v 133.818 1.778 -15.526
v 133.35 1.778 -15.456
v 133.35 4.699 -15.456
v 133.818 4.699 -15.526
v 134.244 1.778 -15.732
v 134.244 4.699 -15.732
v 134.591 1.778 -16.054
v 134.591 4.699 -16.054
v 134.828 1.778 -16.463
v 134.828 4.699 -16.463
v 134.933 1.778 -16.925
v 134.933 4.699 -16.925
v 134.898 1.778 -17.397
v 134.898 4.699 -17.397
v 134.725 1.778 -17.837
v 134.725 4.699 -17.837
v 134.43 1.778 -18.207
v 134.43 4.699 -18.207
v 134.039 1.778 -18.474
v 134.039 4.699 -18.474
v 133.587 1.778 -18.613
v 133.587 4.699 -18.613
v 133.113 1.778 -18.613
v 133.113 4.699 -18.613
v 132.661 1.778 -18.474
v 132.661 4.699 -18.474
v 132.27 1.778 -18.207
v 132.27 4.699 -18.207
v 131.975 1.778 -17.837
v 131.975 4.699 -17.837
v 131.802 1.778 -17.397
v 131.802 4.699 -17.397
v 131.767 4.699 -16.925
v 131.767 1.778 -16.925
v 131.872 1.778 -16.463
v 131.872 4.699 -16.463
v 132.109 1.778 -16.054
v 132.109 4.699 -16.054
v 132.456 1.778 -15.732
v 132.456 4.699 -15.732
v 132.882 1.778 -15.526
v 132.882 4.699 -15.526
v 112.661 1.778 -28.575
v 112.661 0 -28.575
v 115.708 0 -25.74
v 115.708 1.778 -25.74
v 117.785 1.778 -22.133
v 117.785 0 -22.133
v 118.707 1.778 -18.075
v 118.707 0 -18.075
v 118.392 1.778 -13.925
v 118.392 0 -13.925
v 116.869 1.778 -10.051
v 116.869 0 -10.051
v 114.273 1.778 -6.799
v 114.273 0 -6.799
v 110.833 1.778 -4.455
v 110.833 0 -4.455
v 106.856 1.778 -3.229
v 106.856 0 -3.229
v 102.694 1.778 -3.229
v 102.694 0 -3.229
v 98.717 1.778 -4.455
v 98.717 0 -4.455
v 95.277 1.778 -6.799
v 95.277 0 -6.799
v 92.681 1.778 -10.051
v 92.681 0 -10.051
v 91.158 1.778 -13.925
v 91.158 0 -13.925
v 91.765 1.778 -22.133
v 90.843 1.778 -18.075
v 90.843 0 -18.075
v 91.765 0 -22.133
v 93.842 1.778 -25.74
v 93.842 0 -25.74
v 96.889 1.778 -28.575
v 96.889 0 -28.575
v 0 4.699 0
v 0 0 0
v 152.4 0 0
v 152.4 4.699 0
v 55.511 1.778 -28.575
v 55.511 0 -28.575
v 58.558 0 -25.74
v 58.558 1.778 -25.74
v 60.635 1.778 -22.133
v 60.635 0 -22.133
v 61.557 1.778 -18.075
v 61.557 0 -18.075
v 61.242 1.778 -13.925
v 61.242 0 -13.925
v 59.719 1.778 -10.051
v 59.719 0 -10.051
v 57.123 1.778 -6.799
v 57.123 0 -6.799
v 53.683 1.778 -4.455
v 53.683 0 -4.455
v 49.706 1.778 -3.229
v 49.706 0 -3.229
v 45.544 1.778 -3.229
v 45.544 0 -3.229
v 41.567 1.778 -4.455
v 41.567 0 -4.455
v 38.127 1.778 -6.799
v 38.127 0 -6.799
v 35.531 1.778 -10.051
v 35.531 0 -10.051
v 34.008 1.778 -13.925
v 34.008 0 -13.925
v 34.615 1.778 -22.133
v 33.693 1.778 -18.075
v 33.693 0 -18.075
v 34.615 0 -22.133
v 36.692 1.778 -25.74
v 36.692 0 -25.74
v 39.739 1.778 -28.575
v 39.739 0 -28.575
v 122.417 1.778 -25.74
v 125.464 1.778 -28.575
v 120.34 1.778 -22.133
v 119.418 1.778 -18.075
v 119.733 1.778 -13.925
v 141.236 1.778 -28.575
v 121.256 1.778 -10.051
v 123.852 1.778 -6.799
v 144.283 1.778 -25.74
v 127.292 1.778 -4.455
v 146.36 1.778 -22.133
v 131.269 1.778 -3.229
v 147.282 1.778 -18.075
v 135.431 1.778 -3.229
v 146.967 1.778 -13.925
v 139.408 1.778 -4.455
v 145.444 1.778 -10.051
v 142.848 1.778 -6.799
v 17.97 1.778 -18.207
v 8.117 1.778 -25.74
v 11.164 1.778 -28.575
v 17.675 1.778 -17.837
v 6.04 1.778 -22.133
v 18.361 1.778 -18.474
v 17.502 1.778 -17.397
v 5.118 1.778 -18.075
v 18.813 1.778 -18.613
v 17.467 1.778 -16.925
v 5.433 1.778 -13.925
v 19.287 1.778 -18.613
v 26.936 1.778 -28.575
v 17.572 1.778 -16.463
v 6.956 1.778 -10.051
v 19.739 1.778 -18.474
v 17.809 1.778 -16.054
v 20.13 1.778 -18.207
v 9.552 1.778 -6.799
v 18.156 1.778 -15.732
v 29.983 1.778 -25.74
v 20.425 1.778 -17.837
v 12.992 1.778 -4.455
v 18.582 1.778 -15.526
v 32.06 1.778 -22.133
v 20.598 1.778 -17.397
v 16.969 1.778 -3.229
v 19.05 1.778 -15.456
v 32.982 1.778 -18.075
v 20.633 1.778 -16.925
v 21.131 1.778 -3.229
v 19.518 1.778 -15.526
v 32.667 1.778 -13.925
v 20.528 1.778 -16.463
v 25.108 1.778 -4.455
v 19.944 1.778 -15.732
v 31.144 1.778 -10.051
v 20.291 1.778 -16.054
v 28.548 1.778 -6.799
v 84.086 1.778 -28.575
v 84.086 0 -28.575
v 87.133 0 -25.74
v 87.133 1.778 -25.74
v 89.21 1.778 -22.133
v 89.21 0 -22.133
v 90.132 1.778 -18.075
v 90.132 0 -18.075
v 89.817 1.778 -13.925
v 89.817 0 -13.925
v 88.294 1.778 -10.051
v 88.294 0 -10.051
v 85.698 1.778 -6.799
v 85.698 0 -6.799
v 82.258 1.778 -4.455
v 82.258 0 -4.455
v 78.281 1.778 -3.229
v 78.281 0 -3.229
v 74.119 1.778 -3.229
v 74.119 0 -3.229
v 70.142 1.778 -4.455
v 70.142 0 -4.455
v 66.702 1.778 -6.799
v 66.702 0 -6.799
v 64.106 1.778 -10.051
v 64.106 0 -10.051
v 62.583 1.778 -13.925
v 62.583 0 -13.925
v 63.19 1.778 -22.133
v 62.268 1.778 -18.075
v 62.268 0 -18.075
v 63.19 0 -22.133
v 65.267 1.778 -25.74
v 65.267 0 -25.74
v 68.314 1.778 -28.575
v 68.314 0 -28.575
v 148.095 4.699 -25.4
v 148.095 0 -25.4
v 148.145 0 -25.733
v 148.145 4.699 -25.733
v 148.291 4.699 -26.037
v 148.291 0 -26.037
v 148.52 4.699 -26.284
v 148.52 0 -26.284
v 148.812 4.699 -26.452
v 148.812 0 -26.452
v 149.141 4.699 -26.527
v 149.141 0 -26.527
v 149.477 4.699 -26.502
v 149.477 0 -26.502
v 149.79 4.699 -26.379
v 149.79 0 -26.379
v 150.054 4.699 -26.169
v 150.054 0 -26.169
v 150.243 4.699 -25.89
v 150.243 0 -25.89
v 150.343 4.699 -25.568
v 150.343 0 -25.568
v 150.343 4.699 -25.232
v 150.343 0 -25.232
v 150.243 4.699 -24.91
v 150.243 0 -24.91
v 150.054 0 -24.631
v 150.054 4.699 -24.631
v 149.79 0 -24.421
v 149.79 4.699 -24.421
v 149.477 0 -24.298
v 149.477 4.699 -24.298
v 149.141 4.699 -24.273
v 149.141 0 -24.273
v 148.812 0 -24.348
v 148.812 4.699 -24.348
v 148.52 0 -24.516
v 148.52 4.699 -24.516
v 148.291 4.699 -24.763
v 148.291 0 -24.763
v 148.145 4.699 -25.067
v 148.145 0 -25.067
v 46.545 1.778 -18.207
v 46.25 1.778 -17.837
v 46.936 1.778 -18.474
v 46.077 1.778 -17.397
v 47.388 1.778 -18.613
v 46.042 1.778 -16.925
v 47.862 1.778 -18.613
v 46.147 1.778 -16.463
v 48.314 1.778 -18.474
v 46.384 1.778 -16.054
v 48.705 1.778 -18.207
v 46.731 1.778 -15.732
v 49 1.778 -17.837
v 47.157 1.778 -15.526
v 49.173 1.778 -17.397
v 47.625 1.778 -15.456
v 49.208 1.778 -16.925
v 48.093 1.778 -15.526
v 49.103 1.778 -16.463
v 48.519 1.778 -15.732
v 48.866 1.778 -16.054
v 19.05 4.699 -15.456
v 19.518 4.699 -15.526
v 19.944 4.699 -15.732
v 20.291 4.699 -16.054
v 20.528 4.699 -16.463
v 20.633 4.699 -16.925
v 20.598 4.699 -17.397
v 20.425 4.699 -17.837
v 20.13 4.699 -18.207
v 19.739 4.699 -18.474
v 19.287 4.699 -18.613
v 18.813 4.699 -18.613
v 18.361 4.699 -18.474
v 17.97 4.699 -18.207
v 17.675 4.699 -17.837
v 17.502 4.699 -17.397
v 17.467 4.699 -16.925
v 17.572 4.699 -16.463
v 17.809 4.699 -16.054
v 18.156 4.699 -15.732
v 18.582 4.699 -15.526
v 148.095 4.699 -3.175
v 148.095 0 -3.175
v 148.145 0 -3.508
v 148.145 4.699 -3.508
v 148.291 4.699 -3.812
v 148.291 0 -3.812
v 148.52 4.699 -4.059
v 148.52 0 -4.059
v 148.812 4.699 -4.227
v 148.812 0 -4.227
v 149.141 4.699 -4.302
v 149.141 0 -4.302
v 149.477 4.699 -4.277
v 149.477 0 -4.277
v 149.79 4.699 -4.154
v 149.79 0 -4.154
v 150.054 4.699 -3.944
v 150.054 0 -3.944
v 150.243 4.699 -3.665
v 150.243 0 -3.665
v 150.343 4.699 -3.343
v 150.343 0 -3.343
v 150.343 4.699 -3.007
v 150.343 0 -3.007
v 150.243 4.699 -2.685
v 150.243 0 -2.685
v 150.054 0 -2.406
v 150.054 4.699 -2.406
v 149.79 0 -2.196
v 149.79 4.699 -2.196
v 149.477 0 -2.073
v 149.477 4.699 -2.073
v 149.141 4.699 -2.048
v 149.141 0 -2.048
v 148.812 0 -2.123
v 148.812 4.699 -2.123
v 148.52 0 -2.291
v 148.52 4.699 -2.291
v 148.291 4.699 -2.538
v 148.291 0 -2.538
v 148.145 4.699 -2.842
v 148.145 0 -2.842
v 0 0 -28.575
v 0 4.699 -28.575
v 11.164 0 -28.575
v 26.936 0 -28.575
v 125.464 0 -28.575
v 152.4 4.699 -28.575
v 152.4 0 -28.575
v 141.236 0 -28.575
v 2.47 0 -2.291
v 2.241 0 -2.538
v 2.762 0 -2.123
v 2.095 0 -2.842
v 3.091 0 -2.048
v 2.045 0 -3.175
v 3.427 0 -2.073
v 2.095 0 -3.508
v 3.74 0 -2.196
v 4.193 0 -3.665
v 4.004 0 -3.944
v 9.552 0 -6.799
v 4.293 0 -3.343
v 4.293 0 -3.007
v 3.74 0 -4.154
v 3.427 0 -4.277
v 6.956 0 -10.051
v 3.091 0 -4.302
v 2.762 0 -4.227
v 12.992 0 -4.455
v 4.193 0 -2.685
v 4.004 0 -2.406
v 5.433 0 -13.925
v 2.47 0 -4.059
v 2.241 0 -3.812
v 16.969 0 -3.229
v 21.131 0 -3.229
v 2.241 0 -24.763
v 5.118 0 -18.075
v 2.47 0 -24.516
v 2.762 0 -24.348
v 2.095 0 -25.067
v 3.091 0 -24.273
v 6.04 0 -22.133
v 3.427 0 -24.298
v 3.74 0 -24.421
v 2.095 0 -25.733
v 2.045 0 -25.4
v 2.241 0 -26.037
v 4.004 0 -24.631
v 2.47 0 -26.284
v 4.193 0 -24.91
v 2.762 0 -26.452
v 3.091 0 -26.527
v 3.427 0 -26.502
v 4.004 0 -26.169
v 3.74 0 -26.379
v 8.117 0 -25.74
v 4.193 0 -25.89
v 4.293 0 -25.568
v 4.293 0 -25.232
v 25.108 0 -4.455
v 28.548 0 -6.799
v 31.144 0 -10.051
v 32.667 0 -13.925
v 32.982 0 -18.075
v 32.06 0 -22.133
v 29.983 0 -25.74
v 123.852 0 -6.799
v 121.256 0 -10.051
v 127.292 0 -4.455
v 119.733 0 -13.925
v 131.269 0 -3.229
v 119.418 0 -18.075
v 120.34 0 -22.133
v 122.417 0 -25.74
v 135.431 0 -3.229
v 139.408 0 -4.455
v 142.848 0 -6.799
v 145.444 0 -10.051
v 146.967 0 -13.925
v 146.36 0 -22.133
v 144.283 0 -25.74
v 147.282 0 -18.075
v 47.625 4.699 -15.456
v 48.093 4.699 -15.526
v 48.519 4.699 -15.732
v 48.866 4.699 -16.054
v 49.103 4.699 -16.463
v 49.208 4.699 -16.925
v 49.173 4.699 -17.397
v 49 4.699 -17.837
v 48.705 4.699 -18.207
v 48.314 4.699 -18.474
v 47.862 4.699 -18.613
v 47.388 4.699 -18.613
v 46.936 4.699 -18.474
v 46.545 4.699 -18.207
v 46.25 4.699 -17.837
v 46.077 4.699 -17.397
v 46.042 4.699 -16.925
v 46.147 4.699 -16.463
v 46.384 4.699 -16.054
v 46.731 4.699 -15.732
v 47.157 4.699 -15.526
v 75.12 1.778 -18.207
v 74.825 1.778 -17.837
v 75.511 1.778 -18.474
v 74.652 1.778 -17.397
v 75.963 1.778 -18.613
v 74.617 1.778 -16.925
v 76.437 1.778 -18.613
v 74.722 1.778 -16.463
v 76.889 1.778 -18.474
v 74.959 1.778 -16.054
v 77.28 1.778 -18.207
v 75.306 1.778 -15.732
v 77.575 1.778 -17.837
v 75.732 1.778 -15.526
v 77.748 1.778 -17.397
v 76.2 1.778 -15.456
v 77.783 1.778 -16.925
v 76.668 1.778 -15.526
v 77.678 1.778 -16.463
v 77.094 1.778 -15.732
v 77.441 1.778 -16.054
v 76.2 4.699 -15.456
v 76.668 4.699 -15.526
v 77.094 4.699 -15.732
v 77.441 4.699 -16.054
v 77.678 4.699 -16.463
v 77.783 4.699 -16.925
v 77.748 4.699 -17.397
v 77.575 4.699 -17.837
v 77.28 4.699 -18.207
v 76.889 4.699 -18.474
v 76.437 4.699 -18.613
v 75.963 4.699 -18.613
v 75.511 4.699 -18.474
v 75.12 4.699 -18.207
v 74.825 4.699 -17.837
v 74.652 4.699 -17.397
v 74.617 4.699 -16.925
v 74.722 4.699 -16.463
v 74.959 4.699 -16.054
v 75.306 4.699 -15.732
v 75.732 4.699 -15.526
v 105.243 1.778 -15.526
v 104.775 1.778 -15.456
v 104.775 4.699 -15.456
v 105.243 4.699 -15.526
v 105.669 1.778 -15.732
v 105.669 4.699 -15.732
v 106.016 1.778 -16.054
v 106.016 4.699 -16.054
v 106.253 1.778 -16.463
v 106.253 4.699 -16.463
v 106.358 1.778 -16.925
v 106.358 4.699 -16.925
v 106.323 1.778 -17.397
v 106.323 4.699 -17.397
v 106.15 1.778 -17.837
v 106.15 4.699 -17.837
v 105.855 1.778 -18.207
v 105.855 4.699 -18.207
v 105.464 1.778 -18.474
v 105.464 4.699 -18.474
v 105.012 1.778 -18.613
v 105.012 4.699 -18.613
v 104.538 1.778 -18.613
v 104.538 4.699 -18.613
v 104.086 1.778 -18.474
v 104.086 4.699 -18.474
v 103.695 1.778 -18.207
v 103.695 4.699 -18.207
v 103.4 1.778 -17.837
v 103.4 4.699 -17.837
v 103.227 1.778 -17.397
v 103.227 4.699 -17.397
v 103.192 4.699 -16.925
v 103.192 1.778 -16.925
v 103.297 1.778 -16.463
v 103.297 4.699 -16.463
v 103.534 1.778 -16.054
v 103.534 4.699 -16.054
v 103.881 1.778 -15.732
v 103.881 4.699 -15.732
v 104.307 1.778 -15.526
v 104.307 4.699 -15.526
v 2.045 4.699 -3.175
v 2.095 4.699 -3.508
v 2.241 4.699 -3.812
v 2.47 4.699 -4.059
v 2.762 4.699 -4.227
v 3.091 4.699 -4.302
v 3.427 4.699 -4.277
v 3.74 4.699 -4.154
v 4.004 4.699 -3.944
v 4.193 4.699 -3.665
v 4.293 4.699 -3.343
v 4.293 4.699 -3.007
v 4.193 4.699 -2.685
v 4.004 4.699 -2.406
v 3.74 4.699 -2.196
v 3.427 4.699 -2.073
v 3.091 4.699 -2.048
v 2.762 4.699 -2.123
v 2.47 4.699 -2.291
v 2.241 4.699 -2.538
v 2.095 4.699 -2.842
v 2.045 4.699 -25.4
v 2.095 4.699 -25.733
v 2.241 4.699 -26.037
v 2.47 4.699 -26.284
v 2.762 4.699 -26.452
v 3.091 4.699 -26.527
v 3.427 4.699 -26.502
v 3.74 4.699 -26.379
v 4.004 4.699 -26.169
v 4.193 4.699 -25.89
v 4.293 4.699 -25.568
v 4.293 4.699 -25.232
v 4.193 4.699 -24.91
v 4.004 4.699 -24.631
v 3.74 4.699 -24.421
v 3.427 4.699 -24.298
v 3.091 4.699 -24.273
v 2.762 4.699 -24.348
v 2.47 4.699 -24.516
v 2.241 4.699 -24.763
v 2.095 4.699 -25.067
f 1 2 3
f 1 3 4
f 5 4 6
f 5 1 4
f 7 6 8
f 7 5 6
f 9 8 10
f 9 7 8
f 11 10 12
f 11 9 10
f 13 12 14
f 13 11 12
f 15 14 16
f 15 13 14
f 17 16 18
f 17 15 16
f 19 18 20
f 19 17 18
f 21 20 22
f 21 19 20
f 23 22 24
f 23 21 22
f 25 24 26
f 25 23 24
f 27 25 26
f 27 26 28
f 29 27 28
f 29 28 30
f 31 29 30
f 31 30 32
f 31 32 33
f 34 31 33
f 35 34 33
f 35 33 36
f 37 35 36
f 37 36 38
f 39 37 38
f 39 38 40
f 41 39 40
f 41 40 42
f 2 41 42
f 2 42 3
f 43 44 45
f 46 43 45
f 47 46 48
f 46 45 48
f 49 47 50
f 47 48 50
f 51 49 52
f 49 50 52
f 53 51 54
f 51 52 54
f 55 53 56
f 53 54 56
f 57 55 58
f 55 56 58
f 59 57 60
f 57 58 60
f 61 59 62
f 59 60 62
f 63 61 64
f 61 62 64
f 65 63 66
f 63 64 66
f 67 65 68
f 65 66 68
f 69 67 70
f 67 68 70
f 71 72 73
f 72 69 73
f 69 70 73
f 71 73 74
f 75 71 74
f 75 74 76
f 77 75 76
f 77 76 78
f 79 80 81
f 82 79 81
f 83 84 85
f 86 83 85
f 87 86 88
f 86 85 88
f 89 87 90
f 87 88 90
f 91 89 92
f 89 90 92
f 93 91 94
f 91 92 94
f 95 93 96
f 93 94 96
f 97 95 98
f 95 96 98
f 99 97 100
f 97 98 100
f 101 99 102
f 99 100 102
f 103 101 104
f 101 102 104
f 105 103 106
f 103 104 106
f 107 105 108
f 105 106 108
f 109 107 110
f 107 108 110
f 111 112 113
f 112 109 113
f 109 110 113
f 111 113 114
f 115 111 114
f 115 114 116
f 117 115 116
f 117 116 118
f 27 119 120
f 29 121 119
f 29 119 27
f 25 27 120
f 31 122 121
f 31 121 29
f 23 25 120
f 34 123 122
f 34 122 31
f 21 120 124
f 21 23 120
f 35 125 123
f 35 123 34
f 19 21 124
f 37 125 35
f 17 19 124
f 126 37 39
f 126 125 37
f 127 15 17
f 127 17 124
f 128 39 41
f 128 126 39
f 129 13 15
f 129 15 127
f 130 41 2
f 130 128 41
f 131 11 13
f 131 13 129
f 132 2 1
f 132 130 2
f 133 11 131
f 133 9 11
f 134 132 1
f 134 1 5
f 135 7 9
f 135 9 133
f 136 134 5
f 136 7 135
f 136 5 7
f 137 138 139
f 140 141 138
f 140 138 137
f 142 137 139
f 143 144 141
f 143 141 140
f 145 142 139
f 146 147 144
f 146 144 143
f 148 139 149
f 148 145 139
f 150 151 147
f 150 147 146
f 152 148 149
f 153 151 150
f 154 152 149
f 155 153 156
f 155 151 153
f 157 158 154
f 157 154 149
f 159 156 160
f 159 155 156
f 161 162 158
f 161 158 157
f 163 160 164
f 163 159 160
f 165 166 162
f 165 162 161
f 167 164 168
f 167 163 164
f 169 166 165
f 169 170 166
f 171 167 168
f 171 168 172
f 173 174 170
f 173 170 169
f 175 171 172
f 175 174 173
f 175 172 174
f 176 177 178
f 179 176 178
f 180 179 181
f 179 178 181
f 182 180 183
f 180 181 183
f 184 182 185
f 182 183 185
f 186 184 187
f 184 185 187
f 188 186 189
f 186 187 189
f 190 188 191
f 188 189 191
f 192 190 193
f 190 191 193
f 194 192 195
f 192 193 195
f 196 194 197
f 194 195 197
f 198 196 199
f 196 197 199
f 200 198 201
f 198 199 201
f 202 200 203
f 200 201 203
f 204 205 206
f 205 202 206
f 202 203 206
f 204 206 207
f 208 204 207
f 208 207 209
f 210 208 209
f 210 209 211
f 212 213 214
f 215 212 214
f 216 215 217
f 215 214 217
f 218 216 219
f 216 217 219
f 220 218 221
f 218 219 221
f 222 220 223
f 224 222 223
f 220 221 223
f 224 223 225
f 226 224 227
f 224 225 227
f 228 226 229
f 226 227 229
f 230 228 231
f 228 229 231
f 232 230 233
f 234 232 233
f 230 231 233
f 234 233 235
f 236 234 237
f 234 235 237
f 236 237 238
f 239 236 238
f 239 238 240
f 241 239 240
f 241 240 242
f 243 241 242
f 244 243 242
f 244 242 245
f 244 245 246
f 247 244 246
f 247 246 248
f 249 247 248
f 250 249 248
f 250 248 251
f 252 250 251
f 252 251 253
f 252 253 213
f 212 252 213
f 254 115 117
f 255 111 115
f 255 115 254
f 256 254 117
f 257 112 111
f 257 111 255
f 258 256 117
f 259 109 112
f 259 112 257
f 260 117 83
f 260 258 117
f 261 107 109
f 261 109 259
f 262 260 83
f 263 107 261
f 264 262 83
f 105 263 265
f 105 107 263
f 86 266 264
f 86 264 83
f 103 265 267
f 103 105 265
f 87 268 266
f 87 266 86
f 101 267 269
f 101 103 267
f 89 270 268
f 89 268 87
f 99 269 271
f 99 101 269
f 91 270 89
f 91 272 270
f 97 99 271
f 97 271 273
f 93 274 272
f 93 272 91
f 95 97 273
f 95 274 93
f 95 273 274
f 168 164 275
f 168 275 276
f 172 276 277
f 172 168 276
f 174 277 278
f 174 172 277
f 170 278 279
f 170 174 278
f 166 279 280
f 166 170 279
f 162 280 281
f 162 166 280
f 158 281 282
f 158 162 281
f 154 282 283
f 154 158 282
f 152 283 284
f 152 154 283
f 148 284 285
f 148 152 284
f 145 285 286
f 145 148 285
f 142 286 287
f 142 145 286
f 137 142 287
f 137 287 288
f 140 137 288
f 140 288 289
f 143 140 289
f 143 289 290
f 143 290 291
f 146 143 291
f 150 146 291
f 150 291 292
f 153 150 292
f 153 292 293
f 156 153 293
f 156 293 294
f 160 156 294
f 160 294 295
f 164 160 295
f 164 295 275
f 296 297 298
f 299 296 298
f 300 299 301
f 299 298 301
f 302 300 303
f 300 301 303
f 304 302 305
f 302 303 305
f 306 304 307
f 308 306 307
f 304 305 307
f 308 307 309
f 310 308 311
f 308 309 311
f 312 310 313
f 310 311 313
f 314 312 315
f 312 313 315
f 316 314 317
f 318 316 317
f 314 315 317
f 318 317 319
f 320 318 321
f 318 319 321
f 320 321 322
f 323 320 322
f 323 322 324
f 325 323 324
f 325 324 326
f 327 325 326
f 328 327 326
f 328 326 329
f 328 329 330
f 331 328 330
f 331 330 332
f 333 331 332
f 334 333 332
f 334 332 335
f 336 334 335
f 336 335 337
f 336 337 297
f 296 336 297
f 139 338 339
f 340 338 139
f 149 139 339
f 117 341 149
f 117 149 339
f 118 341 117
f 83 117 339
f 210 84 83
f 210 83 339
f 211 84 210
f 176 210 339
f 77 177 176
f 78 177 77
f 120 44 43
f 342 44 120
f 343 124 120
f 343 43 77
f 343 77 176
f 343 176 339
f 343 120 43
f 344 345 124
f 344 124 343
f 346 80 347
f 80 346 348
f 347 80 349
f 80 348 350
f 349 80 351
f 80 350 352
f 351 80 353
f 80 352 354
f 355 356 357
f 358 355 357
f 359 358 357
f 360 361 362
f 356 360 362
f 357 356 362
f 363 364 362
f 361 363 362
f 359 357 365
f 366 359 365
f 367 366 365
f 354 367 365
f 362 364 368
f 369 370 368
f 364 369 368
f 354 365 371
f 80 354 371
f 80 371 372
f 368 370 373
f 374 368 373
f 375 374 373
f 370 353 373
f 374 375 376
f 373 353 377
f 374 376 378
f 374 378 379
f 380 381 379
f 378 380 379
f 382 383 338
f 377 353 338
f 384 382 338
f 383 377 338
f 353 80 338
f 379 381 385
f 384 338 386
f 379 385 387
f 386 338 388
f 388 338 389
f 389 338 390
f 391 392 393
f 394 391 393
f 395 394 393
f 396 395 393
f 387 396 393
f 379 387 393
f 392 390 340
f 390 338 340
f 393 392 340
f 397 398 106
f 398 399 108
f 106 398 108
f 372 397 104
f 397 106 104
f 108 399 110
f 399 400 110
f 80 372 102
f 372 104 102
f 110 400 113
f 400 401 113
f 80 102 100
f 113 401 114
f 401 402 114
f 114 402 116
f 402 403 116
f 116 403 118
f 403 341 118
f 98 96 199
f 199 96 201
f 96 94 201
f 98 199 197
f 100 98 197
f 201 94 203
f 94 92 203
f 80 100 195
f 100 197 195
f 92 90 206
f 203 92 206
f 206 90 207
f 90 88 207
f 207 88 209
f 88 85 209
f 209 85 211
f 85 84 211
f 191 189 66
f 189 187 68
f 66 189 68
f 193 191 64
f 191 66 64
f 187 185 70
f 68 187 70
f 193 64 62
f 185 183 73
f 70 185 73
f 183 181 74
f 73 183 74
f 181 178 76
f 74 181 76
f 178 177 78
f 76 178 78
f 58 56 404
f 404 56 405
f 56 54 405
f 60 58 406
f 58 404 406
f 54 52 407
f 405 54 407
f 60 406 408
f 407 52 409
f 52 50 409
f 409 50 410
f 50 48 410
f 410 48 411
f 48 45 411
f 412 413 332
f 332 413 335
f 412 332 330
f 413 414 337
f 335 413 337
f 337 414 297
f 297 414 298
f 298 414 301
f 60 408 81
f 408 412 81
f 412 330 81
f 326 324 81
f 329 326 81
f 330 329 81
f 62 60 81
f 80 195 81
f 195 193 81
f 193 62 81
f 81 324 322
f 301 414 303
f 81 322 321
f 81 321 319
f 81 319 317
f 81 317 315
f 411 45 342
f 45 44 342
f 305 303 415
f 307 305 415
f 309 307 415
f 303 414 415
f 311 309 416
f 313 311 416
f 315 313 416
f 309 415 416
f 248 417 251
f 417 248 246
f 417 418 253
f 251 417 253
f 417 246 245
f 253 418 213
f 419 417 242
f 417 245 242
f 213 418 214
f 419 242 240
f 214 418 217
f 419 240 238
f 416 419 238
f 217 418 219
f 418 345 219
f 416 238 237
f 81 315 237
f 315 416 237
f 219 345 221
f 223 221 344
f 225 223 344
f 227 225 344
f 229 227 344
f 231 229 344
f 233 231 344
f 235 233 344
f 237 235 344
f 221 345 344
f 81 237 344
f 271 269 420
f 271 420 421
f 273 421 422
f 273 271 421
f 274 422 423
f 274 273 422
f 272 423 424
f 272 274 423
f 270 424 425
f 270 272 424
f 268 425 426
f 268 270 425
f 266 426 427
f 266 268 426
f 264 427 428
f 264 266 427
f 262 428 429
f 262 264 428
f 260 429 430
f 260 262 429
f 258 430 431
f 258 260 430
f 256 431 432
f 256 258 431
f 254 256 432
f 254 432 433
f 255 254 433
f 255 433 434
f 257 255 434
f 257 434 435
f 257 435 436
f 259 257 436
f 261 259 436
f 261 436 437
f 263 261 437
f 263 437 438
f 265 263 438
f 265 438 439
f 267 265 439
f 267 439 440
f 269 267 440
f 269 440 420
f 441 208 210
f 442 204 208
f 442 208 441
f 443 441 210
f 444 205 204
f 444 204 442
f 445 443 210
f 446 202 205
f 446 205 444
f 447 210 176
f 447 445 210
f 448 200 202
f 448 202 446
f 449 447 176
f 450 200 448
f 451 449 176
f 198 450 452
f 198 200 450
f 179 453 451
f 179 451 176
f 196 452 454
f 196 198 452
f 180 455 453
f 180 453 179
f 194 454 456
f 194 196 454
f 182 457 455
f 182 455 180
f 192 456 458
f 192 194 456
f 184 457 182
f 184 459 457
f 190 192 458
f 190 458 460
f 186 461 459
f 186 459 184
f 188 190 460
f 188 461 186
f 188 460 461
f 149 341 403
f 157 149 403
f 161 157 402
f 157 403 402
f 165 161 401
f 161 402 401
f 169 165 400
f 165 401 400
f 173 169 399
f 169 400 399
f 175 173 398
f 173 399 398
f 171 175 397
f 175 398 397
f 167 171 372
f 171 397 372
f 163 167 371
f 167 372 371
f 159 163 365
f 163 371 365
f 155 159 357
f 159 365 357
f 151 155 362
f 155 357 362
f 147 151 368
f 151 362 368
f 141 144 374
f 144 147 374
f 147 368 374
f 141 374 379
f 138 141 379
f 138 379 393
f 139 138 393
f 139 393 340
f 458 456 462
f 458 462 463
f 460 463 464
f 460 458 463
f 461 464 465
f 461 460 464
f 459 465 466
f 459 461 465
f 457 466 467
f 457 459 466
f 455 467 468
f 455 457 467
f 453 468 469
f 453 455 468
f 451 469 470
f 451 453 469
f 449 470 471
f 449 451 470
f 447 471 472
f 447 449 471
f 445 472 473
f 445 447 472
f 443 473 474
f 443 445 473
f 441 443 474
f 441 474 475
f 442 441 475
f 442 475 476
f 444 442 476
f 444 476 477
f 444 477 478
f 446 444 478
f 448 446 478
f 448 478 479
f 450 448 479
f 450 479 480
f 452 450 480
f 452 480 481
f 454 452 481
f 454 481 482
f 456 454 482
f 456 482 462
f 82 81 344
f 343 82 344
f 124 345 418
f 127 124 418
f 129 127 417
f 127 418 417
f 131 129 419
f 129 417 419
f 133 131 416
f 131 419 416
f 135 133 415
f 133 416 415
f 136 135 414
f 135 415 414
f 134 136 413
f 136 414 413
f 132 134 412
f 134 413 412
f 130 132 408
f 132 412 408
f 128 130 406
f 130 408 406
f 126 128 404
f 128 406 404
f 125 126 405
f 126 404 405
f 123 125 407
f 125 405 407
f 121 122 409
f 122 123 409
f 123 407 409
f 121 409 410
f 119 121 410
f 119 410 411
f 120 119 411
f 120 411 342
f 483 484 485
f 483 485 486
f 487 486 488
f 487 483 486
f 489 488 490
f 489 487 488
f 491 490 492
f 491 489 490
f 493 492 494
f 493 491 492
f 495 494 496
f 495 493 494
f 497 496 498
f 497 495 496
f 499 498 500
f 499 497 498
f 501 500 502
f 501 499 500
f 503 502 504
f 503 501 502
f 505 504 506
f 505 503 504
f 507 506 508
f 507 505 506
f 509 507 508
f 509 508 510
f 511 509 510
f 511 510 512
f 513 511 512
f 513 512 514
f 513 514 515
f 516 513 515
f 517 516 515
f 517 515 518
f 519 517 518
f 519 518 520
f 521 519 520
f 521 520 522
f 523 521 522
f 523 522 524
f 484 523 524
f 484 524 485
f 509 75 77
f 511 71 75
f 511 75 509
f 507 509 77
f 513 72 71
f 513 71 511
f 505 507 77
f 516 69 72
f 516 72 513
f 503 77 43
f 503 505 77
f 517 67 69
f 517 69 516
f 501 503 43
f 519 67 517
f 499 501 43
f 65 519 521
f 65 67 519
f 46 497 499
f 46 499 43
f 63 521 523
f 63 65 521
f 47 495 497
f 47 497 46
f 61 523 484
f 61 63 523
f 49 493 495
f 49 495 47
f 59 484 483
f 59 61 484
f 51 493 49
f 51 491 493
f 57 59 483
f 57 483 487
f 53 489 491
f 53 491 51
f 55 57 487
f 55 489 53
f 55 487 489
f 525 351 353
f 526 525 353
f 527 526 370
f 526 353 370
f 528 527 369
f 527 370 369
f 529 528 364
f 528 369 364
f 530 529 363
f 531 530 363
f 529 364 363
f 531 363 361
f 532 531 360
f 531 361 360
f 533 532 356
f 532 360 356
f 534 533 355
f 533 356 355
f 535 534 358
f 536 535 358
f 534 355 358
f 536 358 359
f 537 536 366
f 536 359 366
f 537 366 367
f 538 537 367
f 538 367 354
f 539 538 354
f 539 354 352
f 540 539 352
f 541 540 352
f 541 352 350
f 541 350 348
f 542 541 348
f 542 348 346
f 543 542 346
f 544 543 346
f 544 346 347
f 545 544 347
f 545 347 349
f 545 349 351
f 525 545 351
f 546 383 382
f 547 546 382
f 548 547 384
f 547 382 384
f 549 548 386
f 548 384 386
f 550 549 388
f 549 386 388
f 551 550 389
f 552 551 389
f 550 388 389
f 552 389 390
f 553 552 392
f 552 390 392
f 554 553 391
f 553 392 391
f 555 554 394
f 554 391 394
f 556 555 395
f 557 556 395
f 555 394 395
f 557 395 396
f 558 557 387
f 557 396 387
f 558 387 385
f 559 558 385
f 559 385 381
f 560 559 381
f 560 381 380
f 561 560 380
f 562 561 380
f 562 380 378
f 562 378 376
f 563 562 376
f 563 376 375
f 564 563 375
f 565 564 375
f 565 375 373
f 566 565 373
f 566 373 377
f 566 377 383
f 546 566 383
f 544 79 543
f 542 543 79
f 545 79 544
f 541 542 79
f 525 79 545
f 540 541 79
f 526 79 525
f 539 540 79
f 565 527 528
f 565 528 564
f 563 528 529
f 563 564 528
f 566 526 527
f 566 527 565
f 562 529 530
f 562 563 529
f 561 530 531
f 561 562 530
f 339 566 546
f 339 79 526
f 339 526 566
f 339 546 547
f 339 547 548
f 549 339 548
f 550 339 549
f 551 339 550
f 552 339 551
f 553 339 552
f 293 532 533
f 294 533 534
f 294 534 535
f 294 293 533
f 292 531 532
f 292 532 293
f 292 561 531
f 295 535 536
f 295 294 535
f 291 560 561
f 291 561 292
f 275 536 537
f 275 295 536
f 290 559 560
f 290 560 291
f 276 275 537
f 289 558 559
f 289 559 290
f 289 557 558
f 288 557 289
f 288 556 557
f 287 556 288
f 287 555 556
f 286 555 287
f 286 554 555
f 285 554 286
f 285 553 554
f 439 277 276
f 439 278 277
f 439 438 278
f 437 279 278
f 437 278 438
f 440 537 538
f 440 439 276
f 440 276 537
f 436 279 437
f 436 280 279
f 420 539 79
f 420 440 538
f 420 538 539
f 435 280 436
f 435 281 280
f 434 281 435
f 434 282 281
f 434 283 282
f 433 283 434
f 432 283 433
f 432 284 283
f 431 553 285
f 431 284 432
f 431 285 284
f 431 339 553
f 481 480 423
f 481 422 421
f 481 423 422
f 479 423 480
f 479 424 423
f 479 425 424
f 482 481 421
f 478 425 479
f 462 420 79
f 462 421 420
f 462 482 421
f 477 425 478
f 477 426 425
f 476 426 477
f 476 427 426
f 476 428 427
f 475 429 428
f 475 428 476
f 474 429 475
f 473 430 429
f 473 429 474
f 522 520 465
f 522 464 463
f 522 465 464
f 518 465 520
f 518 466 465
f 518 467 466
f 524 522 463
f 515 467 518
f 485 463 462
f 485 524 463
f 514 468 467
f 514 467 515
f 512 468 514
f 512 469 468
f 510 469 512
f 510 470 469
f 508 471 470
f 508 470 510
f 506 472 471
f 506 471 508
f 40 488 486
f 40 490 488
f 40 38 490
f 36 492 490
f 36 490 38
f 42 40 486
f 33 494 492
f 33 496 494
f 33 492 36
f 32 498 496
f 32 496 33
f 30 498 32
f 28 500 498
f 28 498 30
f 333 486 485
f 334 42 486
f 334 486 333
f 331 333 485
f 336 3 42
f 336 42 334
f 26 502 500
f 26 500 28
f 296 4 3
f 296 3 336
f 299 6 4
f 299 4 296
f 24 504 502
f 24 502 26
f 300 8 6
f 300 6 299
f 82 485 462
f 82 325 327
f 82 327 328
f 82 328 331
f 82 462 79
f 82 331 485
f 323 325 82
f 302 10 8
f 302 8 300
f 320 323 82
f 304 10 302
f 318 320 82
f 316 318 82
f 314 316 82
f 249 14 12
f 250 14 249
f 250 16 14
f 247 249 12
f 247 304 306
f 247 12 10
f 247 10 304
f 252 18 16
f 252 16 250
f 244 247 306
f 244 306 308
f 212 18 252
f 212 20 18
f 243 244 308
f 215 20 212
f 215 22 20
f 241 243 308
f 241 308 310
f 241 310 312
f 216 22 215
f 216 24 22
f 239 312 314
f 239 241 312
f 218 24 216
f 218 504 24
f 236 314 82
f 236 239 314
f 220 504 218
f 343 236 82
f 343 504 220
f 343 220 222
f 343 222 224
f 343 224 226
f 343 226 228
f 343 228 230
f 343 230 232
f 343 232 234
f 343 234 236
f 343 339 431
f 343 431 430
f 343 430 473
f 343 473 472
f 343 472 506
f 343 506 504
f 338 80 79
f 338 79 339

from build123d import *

# Parameters (mm, degrees)
SKETCH1_W             = 152.4
SKETCH1_H             = 28.575
SKETCH1_R             = 1.5875
BOSS_EXTRUDE1_DEPTH   = 4.699
SKETCH2_R             = 13.97
CUT_EXTRUDE1_DEPTH    = 1.778
F_4_40_TAPPED_HOLE1_D = 2.2606


with BuildPart() as part:
    # Sketch1 → Boss-Extrude1 (new body)
    with BuildSketch(Plane(origin=(0, 0, 0), x_dir=(1, 0, 0), z_dir=(0, 1, 0))):
        with Locations((76.2, 14.2875)):
            Rectangle(SKETCH1_W, SKETCH1_H)
        with Locations(Location((19.05, 17.0434, 0), (0, 0, 270))):
            Circle(SKETCH1_R, mode=Mode.SUBTRACT)
        with Locations(Location((47.625, 17.0434, 0), (0, 0, 270))):
            Circle(SKETCH1_R, mode=Mode.SUBTRACT)
        with Locations(Location((76.2, 17.0434, 0), (0, 0, 270))):
            Circle(SKETCH1_R, mode=Mode.SUBTRACT)
        with Locations(Location((104.775, 17.0434, 0), (0, 0, 270))):
            Circle(SKETCH1_R, mode=Mode.SUBTRACT)
        with Locations(Location((133.35, 17.0434, 0), (0, 0, 270))):
            Circle(SKETCH1_R, mode=Mode.SUBTRACT)
    extrude(amount=BOSS_EXTRUDE1_DEPTH)

    # Sketch2 → Cut-Extrude1 (cut)
    with BuildSketch(Plane.XZ):
        with Locations((19.05, -17.0434)):
            Circle(SKETCH2_R)
        with Locations((47.625, -17.0434)):
            Circle(SKETCH2_R)
        with Locations((76.2, -17.0434)):
            Circle(SKETCH2_R)
        with Locations((104.775, -17.0434)):
            Circle(SKETCH2_R)
        with Locations((133.35, -17.0434)):
            Circle(SKETCH2_R)
    extrude(amount=-CUT_EXTRUDE1_DEPTH, mode=Mode.SUBTRACT)

    # #4-40 Tapped Hole1 (through all)
    with Locations(Plane(origin=(0, 4.699, 0), x_dir=(1, 0, 0), z_dir=(0, 1, 0))):
        with Locations((3.175, 25.4), (3.175, 3.175), (149.225, 3.175), (149.225, 25.4)):
            Hole(F_4_40_TAPPED_HOLE1_D / 2)


solid = part.part
